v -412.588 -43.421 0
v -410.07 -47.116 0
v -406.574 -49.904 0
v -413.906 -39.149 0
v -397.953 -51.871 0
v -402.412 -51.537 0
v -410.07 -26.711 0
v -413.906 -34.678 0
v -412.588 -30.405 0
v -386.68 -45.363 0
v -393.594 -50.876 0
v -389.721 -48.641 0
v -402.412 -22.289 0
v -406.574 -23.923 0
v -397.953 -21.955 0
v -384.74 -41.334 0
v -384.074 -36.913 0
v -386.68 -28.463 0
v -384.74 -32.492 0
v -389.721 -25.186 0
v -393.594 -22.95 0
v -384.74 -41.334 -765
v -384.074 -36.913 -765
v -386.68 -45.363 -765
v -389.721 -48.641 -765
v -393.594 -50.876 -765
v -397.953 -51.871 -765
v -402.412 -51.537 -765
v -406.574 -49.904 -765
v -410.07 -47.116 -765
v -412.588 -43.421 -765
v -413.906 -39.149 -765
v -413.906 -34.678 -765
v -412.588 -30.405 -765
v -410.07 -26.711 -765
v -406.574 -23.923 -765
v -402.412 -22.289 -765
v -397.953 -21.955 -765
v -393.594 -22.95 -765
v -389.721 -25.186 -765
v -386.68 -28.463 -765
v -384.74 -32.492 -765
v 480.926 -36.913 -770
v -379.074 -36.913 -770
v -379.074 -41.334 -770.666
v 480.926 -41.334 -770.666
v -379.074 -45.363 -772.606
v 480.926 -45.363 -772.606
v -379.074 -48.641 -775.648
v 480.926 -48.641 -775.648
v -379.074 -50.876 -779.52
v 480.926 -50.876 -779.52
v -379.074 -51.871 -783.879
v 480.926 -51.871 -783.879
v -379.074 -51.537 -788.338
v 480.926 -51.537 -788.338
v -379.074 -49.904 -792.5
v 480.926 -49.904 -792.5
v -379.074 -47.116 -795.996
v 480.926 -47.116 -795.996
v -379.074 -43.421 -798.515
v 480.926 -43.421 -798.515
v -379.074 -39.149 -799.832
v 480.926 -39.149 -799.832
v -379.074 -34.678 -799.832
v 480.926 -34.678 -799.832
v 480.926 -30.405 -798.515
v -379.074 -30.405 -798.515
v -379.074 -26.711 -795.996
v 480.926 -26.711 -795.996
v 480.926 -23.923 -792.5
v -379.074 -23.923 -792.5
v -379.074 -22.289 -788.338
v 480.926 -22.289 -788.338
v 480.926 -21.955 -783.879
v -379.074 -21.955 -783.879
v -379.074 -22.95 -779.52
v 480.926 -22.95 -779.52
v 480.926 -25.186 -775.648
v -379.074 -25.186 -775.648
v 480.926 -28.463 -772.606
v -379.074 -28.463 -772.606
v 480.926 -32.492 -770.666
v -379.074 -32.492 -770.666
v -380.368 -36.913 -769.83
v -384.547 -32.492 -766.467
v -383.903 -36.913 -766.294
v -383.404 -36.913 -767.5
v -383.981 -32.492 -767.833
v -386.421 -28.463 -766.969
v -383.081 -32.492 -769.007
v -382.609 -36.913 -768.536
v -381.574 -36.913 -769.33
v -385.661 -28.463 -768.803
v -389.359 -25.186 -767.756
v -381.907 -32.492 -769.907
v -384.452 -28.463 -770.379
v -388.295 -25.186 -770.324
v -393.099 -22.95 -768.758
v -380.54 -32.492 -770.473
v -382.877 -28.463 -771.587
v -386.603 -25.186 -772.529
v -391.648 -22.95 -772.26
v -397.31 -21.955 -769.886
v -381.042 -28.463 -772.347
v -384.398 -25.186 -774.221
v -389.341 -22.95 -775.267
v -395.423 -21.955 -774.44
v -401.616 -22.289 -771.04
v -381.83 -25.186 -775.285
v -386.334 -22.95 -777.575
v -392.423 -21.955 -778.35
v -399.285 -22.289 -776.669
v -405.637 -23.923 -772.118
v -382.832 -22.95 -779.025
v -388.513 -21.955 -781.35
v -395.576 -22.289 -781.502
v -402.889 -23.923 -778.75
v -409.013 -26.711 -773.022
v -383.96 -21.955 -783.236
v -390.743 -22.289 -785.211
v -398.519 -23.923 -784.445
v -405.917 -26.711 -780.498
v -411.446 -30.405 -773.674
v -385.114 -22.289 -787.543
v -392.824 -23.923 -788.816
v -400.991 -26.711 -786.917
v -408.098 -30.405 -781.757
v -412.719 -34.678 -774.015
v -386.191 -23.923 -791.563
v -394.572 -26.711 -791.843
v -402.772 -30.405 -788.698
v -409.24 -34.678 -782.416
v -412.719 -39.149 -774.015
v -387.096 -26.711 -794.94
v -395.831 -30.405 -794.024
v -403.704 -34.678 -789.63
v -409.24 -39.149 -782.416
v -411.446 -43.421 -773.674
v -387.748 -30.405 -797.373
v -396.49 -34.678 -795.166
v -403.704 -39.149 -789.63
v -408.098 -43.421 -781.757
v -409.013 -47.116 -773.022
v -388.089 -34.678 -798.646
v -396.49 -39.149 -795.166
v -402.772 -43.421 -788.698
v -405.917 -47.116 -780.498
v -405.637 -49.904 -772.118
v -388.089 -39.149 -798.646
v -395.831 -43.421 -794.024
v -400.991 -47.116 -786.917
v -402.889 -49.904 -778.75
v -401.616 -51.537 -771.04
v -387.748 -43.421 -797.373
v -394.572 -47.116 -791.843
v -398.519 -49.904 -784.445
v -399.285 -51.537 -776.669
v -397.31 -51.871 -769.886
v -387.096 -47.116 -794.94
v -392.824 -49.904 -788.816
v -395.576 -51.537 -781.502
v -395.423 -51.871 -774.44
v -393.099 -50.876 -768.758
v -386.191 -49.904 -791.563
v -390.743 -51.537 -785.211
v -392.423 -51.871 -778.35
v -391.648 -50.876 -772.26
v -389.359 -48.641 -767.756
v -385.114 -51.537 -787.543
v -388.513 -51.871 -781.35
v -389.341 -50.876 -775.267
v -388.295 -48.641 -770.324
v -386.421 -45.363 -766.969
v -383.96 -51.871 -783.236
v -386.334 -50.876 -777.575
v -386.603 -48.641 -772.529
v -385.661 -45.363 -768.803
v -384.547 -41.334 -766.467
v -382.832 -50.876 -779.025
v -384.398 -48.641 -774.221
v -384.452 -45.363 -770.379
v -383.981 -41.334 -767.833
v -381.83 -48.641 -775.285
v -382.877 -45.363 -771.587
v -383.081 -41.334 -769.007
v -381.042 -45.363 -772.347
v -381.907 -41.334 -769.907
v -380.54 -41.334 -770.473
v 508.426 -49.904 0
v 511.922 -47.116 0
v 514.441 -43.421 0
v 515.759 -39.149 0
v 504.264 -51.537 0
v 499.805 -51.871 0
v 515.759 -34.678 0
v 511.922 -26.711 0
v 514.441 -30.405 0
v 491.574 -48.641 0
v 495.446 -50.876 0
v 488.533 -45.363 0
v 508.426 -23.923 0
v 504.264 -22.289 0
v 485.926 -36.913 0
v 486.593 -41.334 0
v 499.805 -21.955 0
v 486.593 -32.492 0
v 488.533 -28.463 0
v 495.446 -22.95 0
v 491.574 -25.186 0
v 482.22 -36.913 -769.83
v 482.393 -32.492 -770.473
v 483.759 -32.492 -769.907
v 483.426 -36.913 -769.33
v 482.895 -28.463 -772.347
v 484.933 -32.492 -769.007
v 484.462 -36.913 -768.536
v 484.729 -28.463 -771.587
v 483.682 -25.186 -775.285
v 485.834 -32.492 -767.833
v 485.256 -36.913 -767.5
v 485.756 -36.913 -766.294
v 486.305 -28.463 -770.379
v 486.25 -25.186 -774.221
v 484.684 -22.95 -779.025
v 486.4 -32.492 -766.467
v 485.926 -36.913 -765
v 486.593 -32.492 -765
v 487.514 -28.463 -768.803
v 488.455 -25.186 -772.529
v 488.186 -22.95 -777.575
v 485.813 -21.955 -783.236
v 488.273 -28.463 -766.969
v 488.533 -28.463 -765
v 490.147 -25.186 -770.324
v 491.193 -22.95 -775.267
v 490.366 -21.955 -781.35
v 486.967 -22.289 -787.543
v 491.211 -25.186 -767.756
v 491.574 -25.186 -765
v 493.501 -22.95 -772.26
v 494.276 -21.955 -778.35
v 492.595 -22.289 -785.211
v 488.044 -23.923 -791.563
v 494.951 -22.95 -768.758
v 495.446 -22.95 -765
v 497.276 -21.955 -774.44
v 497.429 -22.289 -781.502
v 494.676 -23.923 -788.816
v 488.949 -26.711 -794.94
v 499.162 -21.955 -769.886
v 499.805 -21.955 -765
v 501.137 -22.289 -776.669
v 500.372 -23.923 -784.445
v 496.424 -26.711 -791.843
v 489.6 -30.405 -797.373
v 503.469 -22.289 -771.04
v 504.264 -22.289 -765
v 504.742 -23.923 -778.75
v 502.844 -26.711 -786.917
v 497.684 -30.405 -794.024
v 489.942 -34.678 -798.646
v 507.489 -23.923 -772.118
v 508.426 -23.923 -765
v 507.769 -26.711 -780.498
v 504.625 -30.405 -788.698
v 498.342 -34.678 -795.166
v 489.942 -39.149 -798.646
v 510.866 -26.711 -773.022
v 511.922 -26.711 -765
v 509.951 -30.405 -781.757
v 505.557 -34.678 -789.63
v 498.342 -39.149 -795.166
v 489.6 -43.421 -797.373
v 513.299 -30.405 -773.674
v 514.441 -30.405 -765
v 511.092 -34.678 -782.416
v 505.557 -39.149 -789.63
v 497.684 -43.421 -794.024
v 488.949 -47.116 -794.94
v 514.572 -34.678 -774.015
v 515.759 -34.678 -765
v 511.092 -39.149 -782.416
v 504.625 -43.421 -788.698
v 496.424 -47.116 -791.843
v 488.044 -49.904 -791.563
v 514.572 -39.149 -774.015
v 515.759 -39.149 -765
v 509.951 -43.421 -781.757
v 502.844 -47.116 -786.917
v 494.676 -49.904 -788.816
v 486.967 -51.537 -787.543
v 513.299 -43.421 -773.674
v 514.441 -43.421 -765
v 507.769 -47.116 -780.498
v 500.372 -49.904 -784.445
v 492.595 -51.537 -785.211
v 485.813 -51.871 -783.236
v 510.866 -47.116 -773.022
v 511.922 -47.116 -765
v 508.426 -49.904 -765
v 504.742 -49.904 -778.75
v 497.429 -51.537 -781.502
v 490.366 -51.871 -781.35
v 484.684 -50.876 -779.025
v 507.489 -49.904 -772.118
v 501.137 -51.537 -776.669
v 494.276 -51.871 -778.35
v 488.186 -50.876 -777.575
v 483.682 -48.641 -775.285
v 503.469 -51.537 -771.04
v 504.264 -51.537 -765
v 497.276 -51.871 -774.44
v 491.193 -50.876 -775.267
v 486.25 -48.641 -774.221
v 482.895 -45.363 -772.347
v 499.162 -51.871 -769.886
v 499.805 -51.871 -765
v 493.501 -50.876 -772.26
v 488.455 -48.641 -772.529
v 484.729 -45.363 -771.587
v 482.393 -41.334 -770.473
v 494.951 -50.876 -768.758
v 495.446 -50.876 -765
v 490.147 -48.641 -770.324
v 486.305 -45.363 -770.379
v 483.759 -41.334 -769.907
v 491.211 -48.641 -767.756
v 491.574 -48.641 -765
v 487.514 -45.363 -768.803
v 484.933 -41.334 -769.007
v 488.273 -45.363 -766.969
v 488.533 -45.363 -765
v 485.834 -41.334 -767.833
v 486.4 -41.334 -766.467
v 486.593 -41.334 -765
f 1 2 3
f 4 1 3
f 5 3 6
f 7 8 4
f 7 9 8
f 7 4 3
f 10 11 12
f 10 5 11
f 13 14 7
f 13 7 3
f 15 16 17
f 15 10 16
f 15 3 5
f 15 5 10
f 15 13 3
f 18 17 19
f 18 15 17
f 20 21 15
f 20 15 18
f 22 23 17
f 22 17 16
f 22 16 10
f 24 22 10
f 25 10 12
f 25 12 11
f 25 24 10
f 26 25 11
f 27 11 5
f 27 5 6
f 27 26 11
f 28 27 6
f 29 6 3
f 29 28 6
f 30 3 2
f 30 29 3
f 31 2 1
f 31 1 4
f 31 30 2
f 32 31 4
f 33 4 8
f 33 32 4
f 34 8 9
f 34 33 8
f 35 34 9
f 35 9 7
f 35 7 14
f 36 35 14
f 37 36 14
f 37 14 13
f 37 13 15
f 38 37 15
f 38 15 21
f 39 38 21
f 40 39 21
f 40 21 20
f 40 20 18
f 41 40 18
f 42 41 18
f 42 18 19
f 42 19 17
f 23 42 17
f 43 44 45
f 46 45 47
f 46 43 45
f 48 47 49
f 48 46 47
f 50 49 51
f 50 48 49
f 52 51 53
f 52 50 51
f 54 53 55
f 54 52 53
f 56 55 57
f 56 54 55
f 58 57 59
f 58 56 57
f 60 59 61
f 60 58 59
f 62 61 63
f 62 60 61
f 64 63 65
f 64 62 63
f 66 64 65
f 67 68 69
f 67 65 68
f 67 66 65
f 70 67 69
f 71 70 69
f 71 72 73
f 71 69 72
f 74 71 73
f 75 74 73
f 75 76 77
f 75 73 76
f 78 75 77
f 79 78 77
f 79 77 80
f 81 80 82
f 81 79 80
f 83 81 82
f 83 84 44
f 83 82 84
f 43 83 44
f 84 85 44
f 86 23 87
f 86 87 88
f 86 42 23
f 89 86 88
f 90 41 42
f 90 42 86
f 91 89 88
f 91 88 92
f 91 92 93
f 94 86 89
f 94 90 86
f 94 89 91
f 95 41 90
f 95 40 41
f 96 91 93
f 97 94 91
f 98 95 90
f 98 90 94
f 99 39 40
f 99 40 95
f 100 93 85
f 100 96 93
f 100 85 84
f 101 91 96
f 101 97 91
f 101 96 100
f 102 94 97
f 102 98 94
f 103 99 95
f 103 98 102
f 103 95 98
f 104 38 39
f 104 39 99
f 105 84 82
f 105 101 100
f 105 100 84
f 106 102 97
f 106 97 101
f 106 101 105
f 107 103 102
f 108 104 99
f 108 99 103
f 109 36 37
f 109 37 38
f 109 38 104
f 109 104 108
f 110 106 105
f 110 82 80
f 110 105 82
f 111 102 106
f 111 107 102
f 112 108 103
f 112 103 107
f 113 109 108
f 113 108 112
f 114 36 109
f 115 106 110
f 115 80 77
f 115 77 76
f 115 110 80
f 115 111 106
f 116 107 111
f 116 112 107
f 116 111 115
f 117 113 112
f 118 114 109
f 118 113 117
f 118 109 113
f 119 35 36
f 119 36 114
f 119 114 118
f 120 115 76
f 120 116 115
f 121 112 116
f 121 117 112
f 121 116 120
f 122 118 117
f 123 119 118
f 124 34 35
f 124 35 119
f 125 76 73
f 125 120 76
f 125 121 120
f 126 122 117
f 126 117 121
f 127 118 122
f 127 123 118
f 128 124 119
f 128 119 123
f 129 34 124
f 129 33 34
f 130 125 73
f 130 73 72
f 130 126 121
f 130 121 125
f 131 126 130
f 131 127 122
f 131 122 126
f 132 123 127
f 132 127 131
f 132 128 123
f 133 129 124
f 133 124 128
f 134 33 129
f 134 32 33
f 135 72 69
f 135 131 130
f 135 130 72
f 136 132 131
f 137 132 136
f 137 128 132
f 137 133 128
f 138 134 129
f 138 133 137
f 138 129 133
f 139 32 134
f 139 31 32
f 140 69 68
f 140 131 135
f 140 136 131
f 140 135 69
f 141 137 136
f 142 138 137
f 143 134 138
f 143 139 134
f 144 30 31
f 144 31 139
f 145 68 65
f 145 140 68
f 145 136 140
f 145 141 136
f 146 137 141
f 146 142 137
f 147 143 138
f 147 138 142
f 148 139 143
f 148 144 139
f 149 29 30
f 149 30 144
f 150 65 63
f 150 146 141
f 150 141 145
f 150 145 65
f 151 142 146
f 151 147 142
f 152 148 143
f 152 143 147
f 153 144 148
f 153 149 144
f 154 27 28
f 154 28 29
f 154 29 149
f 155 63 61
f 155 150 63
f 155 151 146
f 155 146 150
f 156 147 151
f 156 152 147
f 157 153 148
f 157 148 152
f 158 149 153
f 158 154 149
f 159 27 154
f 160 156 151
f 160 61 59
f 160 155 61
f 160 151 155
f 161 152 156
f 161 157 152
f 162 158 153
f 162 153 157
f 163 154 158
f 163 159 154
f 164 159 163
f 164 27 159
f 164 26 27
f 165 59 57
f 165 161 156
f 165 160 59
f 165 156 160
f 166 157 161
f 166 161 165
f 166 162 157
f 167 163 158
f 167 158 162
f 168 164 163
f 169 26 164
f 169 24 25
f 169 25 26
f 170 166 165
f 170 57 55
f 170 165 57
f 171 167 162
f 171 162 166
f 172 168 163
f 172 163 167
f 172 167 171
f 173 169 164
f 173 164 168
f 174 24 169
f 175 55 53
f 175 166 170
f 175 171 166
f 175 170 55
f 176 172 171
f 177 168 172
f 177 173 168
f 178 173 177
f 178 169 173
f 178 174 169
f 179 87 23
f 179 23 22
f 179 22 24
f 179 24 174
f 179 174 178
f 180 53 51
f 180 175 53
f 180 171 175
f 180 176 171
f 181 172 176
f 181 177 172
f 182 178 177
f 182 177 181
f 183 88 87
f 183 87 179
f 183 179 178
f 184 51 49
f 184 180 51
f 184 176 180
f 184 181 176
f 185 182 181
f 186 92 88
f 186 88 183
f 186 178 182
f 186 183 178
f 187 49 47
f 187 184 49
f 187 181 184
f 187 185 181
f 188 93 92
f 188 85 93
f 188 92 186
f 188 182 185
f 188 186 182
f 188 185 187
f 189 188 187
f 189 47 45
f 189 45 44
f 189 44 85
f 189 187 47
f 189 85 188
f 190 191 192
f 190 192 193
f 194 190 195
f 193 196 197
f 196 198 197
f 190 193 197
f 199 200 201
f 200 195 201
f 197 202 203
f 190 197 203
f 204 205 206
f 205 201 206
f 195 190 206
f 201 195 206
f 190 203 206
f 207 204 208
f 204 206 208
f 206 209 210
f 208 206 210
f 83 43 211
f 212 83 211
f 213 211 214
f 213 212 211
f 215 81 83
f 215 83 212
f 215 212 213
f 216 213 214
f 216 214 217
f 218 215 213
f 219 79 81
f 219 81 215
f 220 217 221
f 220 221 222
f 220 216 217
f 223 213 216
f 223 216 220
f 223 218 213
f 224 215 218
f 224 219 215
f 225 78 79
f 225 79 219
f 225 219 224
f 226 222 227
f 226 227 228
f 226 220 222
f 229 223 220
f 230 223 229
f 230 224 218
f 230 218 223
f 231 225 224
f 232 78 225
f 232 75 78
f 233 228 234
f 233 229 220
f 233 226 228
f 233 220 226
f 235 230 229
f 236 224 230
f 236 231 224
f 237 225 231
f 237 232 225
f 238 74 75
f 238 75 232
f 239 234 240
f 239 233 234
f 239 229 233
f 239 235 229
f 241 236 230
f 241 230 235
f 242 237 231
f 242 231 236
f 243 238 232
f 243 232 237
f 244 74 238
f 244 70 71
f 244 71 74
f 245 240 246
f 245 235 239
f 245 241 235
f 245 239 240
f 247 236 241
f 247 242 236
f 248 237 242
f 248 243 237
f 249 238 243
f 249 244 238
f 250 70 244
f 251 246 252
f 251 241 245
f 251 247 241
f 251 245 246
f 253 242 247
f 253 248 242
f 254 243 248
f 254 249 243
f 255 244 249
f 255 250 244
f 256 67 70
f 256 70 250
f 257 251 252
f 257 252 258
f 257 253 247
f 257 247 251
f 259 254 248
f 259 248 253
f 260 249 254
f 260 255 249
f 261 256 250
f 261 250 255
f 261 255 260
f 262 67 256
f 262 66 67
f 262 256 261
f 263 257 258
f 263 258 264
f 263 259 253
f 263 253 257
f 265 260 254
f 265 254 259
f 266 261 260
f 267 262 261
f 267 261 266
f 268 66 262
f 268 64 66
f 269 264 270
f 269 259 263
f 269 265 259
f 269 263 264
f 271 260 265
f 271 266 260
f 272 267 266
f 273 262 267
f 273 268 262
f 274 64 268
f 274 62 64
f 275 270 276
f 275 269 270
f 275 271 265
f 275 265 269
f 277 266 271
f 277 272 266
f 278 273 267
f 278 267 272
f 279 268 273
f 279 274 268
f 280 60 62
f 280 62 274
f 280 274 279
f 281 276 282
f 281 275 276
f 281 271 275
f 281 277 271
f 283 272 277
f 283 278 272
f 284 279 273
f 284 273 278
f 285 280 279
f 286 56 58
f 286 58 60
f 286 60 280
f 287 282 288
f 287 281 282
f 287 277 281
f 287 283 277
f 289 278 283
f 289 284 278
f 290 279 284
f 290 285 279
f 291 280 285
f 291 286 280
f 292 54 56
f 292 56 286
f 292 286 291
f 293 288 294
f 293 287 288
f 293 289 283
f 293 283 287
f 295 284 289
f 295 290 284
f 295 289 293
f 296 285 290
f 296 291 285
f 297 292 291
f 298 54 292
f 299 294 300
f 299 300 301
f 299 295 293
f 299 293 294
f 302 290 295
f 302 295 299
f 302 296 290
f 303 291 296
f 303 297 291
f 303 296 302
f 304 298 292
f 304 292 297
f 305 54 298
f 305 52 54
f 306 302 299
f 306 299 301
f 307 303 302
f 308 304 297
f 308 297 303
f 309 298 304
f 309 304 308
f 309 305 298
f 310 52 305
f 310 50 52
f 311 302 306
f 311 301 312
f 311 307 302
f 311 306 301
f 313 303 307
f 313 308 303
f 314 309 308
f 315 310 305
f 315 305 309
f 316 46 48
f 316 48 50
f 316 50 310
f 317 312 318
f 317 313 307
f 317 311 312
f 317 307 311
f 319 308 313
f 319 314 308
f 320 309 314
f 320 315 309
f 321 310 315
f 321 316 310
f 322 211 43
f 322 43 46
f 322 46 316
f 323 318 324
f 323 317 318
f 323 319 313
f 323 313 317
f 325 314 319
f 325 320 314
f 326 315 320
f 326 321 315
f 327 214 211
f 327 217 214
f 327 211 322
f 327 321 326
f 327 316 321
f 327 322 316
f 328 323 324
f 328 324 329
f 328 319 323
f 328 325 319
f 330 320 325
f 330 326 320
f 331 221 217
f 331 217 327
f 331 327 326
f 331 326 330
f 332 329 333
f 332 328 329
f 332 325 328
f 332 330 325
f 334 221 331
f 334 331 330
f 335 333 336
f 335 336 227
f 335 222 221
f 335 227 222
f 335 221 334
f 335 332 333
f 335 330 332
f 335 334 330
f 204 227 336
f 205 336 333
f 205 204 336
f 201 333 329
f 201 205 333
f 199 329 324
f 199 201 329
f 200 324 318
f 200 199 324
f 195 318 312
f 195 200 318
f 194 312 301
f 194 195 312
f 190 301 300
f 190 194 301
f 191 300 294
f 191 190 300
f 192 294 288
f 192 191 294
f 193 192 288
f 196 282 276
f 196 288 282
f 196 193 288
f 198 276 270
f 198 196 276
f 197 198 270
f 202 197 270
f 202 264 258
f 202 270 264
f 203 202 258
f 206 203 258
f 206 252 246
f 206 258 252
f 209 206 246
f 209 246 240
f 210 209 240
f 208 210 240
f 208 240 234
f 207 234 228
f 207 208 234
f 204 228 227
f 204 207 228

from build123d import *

# Parameters (mm, degrees)
F0_R = 15


with BuildPart() as f3:
    # F3: sweep along a path in F2
    with BuildLine(Plane.XZ.offset(36.91316396)) as f3_path:
        Line((-399.0737497807, 0), (-399.0737497807, -765))
        ThreePointArc((-399.0737497807, -765), (-393.2158854044, -779.1421356237), (-379.0737497807, -785))
        Line((-379.0737497807, -785), (480.9262502193, -785))
        ThreePointArc((480.9262502193, -785), (495.0683858431, -779.1421356237), (500.9262502193, -765))
        Line((500.9262502193, -765), (500.9262502193, 0))
    # F0 (on Top) → F3 (sweep)
    with BuildSketch(Plane.XY):
        with Locations((-399.0737497807, -36.91316396)):
            Circle(F0_R)
    sweep(path=f3_path.line)


solid = f3.part
